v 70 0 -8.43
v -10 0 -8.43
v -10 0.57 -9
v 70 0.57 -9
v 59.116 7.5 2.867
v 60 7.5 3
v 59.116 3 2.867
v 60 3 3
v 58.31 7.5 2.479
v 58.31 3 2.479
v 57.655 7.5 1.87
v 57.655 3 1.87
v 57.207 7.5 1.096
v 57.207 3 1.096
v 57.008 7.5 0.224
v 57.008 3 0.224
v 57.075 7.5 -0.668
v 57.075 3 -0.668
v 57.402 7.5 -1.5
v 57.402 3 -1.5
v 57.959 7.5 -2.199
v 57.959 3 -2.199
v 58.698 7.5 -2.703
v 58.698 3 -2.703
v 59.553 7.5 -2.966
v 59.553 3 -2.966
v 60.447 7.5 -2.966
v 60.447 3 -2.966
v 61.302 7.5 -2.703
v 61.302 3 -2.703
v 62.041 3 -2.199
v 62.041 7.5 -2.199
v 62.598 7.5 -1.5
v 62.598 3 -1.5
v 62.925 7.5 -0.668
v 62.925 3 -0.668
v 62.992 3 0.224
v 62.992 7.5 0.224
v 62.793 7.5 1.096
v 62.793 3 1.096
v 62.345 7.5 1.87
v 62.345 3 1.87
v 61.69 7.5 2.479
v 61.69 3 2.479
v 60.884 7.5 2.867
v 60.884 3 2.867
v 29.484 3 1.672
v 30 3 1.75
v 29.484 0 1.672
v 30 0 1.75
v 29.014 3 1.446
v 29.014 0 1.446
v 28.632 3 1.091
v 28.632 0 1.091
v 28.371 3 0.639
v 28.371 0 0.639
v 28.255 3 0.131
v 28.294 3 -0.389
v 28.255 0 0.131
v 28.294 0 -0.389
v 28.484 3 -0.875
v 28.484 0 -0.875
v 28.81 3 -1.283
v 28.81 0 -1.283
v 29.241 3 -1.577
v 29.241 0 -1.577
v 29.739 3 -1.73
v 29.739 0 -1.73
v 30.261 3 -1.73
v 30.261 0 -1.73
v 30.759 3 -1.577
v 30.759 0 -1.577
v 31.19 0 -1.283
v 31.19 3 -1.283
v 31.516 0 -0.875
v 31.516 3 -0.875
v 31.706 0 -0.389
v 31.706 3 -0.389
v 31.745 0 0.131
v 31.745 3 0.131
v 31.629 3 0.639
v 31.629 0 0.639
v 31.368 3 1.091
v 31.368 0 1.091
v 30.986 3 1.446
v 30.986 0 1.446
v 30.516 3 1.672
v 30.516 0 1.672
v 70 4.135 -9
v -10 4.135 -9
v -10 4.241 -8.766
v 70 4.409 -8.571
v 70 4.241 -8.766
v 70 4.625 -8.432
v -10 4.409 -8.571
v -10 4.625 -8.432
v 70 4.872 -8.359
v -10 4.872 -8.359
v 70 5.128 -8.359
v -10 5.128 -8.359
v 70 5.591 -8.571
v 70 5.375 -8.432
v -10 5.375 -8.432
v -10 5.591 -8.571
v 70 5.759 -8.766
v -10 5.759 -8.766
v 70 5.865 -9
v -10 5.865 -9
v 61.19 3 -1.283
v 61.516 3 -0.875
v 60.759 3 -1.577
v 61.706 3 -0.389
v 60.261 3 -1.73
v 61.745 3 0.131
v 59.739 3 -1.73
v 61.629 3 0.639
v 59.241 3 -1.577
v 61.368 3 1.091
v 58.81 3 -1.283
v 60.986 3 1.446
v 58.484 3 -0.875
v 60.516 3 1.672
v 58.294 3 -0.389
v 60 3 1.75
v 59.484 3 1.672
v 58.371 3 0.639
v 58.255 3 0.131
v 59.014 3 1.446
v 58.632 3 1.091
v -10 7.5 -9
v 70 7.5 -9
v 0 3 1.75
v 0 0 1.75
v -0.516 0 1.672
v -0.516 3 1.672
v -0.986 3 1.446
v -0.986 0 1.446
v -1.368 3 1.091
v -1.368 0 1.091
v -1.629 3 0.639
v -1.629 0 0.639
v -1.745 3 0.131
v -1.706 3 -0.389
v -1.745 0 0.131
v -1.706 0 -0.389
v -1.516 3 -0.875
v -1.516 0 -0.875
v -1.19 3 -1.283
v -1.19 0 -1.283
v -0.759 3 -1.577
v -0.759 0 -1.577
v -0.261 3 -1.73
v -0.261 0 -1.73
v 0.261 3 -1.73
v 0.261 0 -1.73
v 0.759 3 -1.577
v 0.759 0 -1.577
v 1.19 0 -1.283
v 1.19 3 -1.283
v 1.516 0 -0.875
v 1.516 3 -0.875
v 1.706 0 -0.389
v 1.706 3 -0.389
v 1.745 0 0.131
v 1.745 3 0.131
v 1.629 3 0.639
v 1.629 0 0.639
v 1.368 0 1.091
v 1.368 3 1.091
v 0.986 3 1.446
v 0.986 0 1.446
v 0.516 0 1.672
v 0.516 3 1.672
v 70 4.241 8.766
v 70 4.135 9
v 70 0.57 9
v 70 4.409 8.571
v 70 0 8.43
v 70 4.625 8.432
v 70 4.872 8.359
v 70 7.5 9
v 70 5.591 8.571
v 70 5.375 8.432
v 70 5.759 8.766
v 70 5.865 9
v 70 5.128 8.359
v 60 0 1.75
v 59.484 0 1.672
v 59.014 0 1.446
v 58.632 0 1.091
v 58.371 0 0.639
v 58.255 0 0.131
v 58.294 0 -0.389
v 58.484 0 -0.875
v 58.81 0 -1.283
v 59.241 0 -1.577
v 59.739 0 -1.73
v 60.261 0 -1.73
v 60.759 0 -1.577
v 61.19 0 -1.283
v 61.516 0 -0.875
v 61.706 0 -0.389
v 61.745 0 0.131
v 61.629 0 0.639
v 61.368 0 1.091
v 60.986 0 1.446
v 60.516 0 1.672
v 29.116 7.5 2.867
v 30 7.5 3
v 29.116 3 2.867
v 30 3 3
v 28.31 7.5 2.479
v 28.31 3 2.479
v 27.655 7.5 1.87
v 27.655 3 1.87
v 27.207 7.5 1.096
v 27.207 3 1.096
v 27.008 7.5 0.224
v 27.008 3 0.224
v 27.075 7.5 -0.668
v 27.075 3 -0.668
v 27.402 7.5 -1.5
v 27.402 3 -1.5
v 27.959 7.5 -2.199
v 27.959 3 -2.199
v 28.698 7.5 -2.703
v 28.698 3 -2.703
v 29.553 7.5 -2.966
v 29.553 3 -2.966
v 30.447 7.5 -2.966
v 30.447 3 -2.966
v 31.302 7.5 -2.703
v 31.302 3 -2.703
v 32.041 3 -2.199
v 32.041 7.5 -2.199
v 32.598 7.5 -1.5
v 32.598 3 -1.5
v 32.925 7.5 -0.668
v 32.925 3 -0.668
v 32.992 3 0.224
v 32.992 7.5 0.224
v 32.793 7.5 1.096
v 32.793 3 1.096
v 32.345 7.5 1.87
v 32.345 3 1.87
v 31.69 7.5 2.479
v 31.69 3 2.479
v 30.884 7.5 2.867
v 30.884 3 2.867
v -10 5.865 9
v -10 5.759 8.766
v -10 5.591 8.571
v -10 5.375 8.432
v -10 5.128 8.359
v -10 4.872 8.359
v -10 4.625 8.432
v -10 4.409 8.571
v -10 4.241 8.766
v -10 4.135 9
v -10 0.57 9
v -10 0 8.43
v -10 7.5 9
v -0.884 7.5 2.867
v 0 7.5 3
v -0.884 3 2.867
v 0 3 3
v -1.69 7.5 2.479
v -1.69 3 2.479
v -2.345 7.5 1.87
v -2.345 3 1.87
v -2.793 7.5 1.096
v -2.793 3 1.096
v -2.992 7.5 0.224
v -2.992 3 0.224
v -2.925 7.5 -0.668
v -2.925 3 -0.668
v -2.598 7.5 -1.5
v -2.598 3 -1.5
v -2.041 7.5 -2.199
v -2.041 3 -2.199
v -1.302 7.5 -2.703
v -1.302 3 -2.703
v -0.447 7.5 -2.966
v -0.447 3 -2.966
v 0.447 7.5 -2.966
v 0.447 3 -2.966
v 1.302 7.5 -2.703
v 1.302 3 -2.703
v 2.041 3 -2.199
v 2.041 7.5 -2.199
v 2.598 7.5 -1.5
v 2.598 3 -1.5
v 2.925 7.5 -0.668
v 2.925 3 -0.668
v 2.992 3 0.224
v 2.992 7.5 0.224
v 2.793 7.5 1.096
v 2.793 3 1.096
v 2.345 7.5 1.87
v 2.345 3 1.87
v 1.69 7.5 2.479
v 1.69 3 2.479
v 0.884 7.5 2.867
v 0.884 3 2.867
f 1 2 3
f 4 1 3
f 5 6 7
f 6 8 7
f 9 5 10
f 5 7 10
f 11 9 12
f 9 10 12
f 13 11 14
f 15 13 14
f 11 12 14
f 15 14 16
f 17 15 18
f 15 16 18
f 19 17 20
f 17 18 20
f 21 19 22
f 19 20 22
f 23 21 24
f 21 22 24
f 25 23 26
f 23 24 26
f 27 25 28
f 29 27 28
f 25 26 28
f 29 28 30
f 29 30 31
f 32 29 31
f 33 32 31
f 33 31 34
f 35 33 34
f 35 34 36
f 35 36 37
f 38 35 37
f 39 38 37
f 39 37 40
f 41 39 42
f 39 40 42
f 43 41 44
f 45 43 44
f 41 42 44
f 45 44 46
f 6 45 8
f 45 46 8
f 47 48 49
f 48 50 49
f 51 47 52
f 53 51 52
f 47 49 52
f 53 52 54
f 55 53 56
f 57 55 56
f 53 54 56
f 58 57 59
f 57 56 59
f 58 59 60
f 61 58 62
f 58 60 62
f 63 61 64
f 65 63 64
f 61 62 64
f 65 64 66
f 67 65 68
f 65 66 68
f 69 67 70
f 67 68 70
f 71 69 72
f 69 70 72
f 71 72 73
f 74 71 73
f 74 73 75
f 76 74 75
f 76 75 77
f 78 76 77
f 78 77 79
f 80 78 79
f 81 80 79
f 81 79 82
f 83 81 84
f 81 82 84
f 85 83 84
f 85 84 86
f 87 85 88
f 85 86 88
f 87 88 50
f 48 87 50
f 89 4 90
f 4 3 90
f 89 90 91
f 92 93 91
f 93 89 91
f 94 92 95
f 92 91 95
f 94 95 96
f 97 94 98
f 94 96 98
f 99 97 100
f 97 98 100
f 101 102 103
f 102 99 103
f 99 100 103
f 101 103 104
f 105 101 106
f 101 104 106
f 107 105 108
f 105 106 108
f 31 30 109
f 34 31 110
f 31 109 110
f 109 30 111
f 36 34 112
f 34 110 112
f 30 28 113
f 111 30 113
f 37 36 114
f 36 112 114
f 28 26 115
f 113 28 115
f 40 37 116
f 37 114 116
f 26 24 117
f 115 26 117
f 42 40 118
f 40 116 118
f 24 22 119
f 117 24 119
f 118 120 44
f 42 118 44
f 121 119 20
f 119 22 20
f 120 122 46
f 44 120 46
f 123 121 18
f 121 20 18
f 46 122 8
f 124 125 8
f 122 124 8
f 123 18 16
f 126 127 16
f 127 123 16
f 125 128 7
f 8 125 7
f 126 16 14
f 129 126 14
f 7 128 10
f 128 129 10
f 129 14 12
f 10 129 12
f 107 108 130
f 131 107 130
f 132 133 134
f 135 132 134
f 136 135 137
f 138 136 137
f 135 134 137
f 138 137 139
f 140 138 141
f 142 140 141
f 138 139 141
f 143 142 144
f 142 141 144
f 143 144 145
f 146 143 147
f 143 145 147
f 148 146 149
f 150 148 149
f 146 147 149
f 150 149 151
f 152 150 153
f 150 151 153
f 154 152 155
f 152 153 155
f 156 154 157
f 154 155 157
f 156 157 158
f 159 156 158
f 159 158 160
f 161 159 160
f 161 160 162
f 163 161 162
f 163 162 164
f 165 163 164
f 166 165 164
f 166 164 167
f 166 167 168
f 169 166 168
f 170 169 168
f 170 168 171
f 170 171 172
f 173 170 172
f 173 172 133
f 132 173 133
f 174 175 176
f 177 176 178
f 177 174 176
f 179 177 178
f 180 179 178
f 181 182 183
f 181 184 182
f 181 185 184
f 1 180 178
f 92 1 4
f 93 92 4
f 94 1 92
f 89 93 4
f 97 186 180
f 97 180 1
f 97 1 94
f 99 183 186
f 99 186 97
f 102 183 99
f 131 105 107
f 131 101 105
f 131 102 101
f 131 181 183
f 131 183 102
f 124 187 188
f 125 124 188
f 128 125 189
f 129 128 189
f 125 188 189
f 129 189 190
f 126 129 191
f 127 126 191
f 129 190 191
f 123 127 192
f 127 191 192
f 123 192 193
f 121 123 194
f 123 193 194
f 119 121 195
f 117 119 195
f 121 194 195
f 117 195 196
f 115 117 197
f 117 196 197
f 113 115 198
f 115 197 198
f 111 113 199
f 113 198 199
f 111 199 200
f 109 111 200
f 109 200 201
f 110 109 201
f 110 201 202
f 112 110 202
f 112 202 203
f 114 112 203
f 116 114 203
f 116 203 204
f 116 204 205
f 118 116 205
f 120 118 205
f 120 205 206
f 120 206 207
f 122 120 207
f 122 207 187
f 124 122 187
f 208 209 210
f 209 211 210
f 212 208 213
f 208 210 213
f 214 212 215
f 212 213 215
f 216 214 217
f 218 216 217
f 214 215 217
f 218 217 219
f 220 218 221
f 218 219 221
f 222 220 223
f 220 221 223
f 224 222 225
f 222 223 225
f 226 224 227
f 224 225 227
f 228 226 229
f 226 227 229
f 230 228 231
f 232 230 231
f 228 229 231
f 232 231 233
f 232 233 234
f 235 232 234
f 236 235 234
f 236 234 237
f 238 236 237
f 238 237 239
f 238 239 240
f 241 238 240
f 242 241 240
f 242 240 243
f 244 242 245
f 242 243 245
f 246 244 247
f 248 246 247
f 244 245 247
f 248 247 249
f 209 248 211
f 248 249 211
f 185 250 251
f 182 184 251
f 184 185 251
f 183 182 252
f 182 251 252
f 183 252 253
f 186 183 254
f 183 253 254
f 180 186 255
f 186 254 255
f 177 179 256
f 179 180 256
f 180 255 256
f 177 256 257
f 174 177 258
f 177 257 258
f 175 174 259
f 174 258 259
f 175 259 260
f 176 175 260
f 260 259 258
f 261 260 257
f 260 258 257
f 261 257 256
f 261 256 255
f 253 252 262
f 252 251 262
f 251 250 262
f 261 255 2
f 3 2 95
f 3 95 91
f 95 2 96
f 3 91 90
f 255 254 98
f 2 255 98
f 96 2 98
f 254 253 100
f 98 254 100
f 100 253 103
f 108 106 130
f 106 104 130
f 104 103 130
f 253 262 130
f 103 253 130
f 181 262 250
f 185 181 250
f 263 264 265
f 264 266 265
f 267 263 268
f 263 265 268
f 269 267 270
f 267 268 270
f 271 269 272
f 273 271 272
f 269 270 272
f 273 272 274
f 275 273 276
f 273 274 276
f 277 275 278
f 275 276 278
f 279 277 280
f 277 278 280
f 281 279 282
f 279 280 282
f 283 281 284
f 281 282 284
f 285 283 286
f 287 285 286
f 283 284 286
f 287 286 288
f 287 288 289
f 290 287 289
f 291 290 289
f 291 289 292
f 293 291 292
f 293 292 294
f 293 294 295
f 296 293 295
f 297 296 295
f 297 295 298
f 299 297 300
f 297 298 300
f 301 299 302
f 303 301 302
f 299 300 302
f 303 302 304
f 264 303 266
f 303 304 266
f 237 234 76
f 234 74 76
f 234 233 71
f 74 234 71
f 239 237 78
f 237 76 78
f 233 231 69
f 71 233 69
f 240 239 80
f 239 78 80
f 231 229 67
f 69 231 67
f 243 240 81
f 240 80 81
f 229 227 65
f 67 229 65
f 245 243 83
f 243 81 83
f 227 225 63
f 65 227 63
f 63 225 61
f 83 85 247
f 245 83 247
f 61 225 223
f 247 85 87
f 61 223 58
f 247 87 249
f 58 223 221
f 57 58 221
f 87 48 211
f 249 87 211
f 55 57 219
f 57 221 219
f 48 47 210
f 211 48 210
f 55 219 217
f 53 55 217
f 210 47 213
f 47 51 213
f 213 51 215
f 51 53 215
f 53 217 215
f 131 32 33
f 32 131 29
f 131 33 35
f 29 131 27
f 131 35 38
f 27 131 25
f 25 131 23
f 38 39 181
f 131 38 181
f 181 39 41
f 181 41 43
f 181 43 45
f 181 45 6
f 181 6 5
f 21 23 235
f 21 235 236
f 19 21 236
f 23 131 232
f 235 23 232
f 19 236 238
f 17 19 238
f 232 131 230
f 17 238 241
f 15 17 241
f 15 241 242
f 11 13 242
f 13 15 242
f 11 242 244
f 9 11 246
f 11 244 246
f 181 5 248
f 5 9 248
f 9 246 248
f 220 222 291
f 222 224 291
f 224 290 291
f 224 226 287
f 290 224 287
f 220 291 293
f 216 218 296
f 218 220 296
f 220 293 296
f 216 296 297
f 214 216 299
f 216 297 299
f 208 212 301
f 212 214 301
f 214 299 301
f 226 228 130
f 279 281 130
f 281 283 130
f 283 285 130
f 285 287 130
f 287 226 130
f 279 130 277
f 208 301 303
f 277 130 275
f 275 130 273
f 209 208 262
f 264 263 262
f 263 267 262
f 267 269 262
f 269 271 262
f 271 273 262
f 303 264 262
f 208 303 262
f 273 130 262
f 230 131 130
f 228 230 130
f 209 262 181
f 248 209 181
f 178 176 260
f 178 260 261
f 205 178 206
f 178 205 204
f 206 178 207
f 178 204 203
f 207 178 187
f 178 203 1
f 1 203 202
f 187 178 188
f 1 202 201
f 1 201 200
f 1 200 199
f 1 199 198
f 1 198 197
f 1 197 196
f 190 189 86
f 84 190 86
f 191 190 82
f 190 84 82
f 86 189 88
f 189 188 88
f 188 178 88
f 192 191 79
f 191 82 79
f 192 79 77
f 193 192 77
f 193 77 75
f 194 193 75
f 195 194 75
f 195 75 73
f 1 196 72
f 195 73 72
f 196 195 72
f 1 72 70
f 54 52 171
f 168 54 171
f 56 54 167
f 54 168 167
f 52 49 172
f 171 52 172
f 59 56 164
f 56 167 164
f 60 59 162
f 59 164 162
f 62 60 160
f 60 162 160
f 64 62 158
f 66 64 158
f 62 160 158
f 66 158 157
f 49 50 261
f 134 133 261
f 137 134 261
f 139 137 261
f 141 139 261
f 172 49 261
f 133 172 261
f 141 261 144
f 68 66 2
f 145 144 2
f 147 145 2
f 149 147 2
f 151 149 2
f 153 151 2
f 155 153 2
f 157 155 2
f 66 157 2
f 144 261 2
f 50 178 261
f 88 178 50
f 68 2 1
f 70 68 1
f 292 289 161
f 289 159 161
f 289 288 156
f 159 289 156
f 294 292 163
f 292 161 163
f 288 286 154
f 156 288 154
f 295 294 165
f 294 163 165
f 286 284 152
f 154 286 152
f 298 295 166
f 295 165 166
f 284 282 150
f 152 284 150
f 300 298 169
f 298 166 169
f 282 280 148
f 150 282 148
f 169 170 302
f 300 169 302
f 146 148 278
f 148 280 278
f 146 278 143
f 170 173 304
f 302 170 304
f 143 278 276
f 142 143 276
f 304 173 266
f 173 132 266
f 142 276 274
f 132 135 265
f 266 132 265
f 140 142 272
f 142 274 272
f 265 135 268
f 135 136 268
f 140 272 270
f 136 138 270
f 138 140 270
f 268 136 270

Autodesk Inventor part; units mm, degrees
sketch "Sketch_1" plane through (-10, 0, 0) normal (1, 0, 0) x (0, 0, -1)
  arc A0 (-9, 4.1354) -> (-9, 5.8646) centre (-9.25, 5) ccw
  line L0 (-9, 4.1354) -> (-9, 0.57)
  line L1 (-9, 0.57) -> (-8.43, 0)
  line L2 (-8.43, 0) -> (8.43, 0)
  line L3 (8.43, 0) -> (9, 0.57)
  line L4 (9, 0.57) -> (9, 4.1354)
  arc A1 (9, 5.8646) -> (9, 4.1354) centre (9.25, 5) ccw
  line L5 (9, 5.8646) -> (9, 7.5)
  line L6 (9, 7.5) -> (-9, 7.5)
  line L7 (-9, 7.5) -> (-9, 5.8646)
extrude "Extrusion1" add sketch "Sketch_1" along normal blind 80
sketch "Sketch2" plane through (-10, 7.5, 9) normal (0, 1, 0) x (1, 0, 0)
  point P0 (10, 9)
hole "Hole1" at (0, 7.5, 0) direction (0, -1, 0) diameter 3.5 depth 7.5 counterbore diameter 6 counterbore depth 4.5
pattern_linear "Rectangular Pattern1" count 3 spacing 30 along (1, 0, 0) of "Hole1"
ref_plane "rail_XY" through (-10, 0, 0) normal (1, 0, 0) x (0, 0, -1)
ref_plane "rail_YZ" through (-10, 0, 0) normal (0, 0, -1) x (0, 1, 0)
ref_plane "rail_ZX" through (-10, 0, 0) normal (0, 1, 0) x (1, 0, 0)
properties part number "SEBS 9WA UU1T1-80P"
